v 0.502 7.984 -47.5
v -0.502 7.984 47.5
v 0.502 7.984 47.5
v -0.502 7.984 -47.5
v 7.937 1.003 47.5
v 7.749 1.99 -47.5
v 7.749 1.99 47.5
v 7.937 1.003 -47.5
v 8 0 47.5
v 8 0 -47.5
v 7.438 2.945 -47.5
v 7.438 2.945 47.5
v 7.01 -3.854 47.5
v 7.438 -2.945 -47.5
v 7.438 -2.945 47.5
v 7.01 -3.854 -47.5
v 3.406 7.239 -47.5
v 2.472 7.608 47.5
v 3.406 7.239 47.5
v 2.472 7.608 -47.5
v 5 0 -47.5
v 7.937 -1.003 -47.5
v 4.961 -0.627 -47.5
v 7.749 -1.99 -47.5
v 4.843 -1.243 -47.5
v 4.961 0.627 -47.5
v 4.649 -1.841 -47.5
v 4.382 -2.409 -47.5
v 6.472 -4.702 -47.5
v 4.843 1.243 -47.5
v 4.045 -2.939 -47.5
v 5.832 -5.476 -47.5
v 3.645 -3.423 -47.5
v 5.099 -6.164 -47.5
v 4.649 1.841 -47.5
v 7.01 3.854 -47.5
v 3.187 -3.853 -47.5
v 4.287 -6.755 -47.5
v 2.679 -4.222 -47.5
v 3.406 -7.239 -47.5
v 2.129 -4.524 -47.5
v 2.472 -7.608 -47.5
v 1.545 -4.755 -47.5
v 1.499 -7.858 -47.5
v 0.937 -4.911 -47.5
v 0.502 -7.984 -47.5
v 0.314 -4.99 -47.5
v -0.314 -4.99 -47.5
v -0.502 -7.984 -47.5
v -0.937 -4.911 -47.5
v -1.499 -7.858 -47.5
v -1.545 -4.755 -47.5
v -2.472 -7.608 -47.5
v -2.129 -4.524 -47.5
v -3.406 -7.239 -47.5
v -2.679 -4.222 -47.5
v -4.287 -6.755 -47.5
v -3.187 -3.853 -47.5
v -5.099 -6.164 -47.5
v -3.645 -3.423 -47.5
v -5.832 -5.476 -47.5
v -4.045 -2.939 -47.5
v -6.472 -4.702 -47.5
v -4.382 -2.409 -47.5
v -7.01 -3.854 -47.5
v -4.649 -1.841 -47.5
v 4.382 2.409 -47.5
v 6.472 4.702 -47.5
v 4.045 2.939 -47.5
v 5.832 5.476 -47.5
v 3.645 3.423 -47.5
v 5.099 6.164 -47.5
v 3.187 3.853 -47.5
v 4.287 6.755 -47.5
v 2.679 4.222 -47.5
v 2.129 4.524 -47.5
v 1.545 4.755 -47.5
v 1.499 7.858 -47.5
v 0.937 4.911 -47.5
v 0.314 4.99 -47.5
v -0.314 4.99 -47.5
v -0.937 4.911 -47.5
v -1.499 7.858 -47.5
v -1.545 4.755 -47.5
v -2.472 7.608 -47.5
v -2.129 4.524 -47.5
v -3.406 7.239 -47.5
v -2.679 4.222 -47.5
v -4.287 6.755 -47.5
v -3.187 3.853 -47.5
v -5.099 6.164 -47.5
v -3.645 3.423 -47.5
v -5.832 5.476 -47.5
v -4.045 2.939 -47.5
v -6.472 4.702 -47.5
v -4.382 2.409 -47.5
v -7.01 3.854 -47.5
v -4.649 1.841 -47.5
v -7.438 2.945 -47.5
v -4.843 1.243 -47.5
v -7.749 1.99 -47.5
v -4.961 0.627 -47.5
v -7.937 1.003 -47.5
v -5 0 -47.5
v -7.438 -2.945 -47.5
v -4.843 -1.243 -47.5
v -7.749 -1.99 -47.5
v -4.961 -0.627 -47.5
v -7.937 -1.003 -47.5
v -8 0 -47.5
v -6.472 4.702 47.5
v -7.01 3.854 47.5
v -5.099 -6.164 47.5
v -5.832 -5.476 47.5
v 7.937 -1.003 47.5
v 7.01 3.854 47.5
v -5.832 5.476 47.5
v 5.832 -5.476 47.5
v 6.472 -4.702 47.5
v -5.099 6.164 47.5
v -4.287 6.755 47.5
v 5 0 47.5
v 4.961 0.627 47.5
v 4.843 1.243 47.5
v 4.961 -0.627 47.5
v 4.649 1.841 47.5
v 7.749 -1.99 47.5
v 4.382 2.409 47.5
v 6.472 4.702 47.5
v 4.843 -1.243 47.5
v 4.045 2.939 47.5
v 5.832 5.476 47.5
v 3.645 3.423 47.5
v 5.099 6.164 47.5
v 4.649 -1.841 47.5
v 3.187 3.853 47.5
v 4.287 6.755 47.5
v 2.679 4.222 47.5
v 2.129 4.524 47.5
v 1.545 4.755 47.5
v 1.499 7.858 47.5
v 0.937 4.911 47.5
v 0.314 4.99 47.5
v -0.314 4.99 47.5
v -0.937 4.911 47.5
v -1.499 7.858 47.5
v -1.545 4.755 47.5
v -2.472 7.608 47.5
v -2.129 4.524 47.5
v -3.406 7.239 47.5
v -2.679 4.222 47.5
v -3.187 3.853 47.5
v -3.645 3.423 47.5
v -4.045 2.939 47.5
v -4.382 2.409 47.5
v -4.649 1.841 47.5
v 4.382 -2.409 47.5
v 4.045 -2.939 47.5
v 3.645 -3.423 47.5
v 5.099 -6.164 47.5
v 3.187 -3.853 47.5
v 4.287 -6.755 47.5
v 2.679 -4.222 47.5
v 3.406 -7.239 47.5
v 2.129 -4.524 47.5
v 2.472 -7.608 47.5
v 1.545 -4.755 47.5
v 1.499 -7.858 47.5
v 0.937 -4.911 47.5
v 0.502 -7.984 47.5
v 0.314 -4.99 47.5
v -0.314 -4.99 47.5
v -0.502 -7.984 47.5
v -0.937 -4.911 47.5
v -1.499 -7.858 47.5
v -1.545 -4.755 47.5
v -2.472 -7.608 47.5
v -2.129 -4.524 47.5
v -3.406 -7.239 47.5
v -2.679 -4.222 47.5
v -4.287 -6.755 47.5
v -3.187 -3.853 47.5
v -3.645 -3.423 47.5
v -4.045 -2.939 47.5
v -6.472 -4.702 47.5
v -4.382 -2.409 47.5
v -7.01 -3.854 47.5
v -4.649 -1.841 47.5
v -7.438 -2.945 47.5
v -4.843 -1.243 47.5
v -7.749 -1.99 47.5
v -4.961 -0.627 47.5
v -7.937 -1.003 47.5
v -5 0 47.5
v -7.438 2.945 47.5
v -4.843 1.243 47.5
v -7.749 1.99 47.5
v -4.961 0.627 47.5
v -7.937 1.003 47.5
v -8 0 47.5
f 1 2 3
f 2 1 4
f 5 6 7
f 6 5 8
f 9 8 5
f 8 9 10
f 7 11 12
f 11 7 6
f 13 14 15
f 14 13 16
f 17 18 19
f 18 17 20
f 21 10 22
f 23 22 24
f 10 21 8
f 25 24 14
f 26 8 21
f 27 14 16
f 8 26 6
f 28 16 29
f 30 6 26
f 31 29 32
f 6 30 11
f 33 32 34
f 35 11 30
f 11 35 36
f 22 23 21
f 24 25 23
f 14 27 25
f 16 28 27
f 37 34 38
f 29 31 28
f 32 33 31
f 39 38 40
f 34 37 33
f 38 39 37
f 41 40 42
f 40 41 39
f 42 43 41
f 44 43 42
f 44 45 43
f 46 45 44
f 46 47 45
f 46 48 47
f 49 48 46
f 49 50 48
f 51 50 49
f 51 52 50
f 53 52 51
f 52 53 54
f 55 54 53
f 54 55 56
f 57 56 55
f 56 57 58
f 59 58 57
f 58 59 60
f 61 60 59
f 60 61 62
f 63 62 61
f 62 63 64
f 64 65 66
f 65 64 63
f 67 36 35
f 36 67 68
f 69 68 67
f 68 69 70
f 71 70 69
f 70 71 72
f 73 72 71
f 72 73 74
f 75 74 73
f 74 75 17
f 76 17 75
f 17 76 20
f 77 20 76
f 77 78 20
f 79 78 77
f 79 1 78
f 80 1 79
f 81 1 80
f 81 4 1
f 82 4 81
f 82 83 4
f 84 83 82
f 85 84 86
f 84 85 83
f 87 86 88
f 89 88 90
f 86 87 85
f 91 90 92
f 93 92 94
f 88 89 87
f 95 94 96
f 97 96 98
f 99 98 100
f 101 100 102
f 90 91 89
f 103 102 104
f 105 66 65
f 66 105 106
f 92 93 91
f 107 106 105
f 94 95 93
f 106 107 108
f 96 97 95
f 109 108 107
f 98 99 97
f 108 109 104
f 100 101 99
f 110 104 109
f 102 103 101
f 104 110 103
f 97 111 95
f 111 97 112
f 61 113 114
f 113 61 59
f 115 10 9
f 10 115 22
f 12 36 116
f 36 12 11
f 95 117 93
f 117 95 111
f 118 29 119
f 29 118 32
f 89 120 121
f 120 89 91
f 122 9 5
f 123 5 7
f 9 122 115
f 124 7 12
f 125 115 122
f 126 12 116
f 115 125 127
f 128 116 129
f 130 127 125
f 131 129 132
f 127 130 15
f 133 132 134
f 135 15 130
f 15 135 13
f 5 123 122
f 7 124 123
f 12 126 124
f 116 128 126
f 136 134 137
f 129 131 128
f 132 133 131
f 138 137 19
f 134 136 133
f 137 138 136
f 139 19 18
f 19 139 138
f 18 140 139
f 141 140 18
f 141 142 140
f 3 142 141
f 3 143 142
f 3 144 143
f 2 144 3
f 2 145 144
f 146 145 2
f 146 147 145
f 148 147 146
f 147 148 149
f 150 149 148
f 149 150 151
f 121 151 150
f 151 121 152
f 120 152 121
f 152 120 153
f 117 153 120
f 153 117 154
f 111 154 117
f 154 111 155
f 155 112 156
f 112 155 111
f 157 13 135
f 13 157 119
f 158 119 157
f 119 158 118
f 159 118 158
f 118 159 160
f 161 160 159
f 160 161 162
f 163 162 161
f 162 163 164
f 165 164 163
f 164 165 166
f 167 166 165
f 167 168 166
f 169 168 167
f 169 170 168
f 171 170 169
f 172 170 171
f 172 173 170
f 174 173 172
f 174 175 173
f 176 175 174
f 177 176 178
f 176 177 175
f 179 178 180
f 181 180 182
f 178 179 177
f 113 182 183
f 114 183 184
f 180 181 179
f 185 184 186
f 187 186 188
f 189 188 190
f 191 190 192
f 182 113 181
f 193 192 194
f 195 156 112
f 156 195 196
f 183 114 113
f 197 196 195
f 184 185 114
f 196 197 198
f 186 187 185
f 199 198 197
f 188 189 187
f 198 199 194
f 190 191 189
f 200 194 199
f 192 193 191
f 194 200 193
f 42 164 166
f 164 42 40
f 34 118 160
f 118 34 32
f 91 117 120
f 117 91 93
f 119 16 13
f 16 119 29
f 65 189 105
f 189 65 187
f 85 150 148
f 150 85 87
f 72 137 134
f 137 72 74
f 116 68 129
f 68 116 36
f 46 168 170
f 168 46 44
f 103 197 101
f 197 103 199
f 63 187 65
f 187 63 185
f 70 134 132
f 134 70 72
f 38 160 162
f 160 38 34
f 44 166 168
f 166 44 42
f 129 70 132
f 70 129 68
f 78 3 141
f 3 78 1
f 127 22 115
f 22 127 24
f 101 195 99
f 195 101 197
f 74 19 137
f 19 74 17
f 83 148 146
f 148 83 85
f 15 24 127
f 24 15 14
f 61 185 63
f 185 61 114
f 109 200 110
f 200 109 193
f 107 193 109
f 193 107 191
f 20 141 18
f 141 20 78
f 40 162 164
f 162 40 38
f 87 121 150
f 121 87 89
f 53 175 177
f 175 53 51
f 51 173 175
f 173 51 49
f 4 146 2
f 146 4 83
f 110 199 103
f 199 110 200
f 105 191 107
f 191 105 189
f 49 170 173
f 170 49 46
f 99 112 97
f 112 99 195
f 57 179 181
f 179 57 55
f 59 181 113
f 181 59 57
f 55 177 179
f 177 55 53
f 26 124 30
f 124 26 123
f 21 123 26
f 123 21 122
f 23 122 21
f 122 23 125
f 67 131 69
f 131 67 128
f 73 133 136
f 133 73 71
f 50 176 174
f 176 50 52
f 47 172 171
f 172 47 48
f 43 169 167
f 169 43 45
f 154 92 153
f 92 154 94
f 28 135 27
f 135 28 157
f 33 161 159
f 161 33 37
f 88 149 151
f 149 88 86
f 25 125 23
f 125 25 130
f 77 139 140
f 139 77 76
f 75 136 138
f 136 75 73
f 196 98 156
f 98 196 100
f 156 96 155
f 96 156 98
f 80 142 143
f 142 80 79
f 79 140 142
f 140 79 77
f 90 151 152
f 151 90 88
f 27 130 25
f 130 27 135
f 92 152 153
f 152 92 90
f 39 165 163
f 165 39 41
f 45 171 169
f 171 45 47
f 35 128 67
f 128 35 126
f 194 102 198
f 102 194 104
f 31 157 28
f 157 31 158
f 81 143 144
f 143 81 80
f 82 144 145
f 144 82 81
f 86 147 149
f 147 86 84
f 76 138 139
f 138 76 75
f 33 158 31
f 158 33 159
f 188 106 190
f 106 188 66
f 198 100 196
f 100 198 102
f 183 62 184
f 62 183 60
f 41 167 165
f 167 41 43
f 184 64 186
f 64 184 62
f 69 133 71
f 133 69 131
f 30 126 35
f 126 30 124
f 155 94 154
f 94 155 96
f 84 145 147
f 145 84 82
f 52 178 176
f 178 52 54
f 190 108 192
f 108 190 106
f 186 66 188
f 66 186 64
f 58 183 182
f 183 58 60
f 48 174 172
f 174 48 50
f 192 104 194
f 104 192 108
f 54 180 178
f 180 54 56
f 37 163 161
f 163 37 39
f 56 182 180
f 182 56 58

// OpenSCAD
$fn = 50;


difference() {
	union() {
		translate(v = [0, 0, -47.5000000000]) {
			cylinder(h = 95, r = 8.0000000000);
		}
	}
	union() {
		translate(v = [0, 0, -100.0000000000]) {
			cylinder(h = 200, r = 5.0000000000);
		}
	}
}
